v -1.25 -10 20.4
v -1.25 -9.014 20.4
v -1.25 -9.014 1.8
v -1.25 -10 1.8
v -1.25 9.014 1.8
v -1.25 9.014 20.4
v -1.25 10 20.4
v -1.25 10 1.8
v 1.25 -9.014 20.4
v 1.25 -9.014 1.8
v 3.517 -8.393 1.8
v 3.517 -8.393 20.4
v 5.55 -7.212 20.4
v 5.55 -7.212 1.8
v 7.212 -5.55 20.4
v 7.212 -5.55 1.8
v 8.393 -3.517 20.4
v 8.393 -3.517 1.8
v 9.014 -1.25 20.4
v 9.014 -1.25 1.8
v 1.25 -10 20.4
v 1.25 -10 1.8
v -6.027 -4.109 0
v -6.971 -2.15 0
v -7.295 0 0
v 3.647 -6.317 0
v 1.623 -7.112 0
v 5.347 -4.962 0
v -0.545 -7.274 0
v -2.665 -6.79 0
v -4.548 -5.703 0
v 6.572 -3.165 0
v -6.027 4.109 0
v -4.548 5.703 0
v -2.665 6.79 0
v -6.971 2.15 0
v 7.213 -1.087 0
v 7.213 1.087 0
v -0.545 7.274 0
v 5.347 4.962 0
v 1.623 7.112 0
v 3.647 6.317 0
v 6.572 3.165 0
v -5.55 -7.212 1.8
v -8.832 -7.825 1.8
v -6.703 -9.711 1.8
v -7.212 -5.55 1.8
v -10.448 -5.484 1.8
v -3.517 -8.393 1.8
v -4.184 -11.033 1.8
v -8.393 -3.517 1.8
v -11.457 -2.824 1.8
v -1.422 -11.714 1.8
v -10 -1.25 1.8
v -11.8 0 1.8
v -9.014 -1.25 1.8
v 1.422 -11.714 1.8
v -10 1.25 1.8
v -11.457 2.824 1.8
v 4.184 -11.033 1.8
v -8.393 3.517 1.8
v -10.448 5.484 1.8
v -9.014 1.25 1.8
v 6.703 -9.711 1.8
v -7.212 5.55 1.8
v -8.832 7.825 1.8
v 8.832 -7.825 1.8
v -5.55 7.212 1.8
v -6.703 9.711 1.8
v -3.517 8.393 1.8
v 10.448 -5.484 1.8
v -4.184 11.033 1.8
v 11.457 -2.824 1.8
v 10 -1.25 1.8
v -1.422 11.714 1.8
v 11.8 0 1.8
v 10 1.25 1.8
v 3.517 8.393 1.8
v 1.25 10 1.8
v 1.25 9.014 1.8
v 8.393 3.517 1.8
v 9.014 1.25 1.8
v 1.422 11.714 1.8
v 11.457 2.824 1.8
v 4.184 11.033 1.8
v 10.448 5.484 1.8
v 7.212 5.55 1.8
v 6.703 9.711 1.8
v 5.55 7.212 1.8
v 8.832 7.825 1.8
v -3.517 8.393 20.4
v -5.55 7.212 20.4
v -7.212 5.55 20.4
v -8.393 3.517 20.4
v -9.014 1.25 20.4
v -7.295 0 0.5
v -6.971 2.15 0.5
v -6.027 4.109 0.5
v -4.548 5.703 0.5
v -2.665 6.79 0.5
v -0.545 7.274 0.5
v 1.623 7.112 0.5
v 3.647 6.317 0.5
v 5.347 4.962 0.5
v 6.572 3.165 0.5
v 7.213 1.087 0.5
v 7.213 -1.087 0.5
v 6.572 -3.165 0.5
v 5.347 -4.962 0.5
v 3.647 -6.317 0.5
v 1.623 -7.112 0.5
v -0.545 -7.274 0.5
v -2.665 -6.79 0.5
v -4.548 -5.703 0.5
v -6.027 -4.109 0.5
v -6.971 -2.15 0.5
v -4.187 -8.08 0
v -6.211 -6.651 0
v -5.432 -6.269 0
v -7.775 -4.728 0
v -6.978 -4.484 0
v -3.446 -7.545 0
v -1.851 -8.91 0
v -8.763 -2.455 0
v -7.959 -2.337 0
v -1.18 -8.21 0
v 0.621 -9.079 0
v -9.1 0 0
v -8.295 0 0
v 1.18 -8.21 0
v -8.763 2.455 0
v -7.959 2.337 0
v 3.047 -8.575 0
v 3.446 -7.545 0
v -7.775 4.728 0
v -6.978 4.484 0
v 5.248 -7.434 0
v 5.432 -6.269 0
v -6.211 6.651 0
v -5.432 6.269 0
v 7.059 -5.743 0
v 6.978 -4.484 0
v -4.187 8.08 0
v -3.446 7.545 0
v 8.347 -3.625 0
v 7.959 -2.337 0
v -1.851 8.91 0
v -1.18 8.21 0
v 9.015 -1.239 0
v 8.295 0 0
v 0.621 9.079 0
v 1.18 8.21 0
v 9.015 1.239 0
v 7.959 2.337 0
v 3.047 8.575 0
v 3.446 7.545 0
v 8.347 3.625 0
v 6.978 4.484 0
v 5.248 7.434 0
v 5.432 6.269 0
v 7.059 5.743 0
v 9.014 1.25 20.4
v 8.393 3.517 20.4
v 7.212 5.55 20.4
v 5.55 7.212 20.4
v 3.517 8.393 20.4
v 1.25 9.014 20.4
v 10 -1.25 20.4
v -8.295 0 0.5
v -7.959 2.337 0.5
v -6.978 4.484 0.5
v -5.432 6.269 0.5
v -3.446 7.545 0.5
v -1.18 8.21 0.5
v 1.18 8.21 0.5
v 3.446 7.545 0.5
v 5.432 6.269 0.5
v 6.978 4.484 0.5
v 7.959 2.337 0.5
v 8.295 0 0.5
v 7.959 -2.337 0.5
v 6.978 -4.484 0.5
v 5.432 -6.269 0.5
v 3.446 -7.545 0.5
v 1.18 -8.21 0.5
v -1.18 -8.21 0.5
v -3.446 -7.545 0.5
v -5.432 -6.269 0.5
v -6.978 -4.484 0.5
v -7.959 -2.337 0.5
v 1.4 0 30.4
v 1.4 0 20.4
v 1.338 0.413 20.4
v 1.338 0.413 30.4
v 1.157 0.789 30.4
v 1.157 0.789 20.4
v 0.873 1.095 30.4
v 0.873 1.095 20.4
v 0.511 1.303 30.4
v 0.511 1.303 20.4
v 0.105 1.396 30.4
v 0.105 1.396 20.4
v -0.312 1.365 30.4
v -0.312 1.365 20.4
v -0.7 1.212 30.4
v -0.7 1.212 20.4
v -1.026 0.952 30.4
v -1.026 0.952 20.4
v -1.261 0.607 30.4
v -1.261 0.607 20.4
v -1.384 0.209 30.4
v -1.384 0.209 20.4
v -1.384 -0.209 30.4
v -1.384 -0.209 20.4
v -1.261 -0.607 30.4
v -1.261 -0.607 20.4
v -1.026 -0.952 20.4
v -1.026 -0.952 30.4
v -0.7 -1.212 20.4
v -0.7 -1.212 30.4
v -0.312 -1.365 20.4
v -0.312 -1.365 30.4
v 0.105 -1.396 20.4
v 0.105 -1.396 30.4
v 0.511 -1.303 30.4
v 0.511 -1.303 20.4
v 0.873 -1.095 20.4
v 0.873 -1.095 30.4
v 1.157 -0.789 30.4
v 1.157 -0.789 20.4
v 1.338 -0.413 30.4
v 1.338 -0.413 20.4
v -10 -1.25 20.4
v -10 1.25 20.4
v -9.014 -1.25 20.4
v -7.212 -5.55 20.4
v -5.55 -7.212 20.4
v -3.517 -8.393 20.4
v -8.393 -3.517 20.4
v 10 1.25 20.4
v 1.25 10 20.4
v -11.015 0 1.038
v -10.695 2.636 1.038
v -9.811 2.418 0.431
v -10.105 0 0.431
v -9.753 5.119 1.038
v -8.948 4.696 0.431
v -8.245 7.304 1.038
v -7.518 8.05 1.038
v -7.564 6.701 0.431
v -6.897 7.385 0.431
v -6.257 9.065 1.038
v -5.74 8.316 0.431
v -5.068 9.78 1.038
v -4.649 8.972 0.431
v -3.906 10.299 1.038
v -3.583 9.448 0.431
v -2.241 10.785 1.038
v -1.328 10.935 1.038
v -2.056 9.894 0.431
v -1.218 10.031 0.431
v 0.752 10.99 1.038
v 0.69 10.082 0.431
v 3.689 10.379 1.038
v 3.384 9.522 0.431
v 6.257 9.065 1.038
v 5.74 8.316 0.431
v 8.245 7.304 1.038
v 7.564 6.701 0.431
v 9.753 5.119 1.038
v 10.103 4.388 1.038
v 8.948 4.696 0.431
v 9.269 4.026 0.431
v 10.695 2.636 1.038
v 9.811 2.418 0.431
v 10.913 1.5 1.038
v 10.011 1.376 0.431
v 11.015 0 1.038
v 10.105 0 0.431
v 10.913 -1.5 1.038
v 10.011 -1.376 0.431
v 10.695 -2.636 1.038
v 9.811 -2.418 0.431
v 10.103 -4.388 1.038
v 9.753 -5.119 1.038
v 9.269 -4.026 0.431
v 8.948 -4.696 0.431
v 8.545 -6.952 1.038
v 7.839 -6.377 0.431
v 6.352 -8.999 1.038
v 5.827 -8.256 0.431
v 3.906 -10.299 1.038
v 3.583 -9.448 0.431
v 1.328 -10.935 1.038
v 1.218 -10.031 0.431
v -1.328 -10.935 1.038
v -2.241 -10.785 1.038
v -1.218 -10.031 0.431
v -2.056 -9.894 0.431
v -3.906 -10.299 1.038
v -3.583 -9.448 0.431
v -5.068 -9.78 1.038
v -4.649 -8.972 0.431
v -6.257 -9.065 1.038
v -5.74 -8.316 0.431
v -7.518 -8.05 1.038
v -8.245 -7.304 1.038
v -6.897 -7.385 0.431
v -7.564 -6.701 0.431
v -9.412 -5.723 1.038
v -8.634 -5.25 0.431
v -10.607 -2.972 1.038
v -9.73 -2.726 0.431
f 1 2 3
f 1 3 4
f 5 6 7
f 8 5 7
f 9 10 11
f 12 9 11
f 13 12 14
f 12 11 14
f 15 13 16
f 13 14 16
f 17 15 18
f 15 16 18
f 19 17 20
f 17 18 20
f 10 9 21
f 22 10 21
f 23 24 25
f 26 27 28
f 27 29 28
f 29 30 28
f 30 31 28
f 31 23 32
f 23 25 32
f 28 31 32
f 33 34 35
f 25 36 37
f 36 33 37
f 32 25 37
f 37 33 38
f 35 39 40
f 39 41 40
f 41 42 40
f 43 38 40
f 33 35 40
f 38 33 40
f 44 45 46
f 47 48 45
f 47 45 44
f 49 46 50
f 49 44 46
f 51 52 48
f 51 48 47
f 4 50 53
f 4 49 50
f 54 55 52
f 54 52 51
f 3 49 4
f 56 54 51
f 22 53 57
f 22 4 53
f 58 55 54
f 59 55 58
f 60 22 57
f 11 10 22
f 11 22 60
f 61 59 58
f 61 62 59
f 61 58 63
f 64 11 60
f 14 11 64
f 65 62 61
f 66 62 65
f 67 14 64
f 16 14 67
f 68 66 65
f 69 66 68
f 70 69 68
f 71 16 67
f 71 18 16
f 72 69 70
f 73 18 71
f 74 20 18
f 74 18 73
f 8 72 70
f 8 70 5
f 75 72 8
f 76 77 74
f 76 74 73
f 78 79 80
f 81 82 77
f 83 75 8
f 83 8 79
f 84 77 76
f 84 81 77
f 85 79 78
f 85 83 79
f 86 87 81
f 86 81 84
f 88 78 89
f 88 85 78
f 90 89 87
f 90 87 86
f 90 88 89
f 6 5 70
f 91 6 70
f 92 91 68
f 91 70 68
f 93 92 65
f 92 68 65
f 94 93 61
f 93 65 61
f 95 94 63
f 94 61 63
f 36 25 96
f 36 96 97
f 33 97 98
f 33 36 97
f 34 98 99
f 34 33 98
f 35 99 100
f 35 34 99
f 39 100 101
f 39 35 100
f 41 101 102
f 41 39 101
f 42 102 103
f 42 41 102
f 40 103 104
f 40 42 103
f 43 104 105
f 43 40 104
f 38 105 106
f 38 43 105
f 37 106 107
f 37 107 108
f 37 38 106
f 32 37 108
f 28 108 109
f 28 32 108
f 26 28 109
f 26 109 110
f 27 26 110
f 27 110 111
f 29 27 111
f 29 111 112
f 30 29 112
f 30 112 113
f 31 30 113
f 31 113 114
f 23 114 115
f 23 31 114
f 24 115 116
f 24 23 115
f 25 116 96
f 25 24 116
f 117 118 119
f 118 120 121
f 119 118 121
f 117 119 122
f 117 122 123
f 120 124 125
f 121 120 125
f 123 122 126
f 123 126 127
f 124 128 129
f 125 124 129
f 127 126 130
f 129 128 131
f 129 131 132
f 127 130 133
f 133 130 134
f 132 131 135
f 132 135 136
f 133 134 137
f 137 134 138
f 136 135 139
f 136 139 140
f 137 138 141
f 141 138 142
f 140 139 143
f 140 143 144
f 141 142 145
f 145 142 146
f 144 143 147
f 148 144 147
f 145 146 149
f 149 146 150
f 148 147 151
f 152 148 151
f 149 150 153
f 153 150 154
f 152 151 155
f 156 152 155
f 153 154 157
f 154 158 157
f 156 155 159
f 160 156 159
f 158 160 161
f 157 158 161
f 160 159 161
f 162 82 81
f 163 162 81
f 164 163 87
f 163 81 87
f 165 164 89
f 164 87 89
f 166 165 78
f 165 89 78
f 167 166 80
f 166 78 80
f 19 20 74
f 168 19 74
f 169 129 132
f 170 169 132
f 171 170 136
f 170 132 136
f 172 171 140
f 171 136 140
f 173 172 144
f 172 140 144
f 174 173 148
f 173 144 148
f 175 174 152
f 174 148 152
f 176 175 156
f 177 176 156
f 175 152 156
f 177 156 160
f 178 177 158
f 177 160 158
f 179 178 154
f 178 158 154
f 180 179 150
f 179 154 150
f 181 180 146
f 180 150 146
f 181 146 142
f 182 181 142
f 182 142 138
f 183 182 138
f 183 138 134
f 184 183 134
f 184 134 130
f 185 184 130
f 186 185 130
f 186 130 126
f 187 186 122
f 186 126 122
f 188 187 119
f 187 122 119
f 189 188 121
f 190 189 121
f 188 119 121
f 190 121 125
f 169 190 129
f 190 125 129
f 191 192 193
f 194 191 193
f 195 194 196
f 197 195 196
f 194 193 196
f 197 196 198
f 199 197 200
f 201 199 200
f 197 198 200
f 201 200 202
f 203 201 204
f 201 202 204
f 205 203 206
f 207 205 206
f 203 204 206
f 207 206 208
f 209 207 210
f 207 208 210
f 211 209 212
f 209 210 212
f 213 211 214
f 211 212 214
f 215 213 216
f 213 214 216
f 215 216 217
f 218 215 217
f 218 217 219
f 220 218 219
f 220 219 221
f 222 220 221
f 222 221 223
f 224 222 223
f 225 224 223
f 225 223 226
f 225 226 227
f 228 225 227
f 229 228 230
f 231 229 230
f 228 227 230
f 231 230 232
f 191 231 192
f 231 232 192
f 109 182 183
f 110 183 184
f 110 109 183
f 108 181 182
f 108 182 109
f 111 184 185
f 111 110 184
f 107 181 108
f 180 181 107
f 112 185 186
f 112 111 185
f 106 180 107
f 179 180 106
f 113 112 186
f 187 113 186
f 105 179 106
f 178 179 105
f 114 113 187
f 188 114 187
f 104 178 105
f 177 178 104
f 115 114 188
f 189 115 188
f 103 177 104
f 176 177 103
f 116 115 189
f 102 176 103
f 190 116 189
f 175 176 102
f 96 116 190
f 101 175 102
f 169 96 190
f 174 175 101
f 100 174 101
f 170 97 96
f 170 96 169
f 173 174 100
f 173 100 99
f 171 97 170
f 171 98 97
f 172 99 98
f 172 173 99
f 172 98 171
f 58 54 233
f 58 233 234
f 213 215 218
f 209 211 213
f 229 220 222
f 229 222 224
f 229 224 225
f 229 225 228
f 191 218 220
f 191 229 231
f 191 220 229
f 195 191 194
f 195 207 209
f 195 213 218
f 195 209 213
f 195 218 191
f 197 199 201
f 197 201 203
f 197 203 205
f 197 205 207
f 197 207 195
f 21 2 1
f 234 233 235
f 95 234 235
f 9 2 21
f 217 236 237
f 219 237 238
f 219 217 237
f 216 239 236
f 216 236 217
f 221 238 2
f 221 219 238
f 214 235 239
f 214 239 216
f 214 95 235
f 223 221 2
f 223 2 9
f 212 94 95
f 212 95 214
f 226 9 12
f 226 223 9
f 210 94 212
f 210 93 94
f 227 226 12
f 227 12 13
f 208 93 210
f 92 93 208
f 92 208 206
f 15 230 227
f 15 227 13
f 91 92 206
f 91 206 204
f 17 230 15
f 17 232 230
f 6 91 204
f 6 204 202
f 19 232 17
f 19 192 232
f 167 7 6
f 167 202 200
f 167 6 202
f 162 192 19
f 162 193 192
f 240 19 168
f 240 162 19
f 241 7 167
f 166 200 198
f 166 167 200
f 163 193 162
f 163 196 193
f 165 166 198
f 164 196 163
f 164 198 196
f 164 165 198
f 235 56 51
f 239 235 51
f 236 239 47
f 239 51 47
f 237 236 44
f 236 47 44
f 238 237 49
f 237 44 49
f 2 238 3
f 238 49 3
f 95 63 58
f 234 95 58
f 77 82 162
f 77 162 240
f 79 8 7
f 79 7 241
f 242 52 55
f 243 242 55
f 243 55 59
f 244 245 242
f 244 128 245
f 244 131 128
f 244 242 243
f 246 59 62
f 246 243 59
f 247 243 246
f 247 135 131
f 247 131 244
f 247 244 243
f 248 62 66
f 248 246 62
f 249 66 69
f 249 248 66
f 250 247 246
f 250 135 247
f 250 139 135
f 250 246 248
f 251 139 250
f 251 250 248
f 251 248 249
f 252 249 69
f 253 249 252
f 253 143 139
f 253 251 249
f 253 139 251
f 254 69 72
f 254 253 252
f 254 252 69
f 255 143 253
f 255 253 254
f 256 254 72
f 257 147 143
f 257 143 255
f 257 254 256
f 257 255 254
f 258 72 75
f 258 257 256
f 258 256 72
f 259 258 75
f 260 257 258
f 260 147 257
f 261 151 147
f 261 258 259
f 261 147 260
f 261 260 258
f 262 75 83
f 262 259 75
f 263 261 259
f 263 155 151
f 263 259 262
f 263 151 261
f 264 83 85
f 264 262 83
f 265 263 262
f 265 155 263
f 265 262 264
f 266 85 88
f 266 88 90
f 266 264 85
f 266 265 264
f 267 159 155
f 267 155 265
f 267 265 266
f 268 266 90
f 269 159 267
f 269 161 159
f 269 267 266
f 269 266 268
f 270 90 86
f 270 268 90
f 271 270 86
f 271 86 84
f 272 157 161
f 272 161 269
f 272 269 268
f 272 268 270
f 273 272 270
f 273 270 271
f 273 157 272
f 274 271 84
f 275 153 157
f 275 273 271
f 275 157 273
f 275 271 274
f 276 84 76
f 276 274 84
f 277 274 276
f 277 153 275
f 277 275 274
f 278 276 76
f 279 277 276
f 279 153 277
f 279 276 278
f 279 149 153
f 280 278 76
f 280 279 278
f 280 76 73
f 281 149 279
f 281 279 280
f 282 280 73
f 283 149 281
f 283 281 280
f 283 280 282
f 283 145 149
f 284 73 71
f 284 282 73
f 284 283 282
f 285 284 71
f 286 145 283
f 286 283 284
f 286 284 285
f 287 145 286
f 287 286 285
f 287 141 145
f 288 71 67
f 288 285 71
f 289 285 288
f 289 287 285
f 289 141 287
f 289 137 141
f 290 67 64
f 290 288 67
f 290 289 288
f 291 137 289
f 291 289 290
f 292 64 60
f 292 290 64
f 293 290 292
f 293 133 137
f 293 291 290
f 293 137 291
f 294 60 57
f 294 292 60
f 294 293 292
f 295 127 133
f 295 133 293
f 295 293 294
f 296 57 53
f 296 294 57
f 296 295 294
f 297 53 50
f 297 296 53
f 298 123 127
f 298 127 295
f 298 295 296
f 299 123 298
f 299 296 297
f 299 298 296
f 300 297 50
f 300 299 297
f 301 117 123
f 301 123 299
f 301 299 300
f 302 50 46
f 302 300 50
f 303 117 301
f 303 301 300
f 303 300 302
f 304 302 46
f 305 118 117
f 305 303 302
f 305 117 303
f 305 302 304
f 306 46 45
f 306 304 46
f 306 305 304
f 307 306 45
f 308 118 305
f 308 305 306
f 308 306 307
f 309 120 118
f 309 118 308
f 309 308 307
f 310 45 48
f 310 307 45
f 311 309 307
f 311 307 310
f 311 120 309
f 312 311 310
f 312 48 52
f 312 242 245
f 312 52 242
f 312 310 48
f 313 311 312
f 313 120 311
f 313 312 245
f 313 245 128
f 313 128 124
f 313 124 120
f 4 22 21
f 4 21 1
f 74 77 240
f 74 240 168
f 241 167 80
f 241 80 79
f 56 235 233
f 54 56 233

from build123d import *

# Parameters (mm, degrees)
SKETCH_1_R               = 9.1
EXTRUDE_1_DEPTH          = 20.4
SKETCH_3_R               = 8.294737136
SKETCH_3_R_2             = 7.294737136
CUT_EXTRUDE_1_DEPTH      = 0.5
SKETCH_4_W               = 2.5
SKETCH_4_H               = 2
EXTRUDE_2_DEPTH          = 18.6
PATTERN_CIRCULAR_1_COUNT = 4
SKETCH_5_R               = 1.4
EXTRUDE_3_DEPTH          = 10


with BuildPart() as part:
    # 草图1 → 凸台-拉伸1 (new body)
    with BuildSketch(Plane.XY):
        Circle(SKETCH_1_R)
    extrude(amount=EXTRUDE_1_DEPTH)

    # 草图2 → 旋转1 (revolve)
    with BuildSketch(Plane(origin=(0, 0, 0), x_dir=(0, 0, -1), z_dir=(1, 0, 0)), mode=Mode.PRIVATE) as revolve_1_sk:
        with BuildLine():
            Line((-1.8, 9.1), (-1.8, 11.8))
            ThreePointArc((-1.8, 11.8), (-0.714004188, 10.573997208), (0, 9.1))
            Line((0, 9.1), (-1.8, 9.1))
        make_face()
    revolve(revolve_1_sk.sketch.rotate(Axis((0, 0, 20.4), (0, 0, -1)), 270), axis=Axis((0, 0, 20.4), (0, 0, -1)))

    # 草图3 → 切除-拉伸1 (cut)
    with BuildSketch(Plane(origin=(0, 0, 0), x_dir=(-1, 0, 0), z_dir=(0, 0, -1))):
        Circle(SKETCH_3_R)
        Circle(SKETCH_3_R_2, mode=Mode.SUBTRACT)
    extrude(amount=-CUT_EXTRUDE_1_DEPTH, mode=Mode.SUBTRACT)

    # 草图4 → 凸台-拉伸2 (add)
    with BuildSketch(Plane.XY.offset(20.4)):
        with Locations((0, 9)):
            Rectangle(SKETCH_4_W, SKETCH_4_H)
    extrude_2 = extrude(amount=-EXTRUDE_2_DEPTH)

    # 阵列(圆周)1: 凸台-拉伸2 ×4 about axis
    pattern_circular_1_axis = Axis((0, 0, 0), (0, 0, 1))
    for i in range(1, PATTERN_CIRCULAR_1_COUNT):
        add(extrude_2.rotate(pattern_circular_1_axis, i * 360 / PATTERN_CIRCULAR_1_COUNT))

    # 草图5 → 凸台-拉伸3 (add)
    with BuildSketch(Plane.XY.offset(20.4)):
        Circle(SKETCH_5_R)
    extrude(amount=EXTRUDE_3_DEPTH)


solid = part.part
